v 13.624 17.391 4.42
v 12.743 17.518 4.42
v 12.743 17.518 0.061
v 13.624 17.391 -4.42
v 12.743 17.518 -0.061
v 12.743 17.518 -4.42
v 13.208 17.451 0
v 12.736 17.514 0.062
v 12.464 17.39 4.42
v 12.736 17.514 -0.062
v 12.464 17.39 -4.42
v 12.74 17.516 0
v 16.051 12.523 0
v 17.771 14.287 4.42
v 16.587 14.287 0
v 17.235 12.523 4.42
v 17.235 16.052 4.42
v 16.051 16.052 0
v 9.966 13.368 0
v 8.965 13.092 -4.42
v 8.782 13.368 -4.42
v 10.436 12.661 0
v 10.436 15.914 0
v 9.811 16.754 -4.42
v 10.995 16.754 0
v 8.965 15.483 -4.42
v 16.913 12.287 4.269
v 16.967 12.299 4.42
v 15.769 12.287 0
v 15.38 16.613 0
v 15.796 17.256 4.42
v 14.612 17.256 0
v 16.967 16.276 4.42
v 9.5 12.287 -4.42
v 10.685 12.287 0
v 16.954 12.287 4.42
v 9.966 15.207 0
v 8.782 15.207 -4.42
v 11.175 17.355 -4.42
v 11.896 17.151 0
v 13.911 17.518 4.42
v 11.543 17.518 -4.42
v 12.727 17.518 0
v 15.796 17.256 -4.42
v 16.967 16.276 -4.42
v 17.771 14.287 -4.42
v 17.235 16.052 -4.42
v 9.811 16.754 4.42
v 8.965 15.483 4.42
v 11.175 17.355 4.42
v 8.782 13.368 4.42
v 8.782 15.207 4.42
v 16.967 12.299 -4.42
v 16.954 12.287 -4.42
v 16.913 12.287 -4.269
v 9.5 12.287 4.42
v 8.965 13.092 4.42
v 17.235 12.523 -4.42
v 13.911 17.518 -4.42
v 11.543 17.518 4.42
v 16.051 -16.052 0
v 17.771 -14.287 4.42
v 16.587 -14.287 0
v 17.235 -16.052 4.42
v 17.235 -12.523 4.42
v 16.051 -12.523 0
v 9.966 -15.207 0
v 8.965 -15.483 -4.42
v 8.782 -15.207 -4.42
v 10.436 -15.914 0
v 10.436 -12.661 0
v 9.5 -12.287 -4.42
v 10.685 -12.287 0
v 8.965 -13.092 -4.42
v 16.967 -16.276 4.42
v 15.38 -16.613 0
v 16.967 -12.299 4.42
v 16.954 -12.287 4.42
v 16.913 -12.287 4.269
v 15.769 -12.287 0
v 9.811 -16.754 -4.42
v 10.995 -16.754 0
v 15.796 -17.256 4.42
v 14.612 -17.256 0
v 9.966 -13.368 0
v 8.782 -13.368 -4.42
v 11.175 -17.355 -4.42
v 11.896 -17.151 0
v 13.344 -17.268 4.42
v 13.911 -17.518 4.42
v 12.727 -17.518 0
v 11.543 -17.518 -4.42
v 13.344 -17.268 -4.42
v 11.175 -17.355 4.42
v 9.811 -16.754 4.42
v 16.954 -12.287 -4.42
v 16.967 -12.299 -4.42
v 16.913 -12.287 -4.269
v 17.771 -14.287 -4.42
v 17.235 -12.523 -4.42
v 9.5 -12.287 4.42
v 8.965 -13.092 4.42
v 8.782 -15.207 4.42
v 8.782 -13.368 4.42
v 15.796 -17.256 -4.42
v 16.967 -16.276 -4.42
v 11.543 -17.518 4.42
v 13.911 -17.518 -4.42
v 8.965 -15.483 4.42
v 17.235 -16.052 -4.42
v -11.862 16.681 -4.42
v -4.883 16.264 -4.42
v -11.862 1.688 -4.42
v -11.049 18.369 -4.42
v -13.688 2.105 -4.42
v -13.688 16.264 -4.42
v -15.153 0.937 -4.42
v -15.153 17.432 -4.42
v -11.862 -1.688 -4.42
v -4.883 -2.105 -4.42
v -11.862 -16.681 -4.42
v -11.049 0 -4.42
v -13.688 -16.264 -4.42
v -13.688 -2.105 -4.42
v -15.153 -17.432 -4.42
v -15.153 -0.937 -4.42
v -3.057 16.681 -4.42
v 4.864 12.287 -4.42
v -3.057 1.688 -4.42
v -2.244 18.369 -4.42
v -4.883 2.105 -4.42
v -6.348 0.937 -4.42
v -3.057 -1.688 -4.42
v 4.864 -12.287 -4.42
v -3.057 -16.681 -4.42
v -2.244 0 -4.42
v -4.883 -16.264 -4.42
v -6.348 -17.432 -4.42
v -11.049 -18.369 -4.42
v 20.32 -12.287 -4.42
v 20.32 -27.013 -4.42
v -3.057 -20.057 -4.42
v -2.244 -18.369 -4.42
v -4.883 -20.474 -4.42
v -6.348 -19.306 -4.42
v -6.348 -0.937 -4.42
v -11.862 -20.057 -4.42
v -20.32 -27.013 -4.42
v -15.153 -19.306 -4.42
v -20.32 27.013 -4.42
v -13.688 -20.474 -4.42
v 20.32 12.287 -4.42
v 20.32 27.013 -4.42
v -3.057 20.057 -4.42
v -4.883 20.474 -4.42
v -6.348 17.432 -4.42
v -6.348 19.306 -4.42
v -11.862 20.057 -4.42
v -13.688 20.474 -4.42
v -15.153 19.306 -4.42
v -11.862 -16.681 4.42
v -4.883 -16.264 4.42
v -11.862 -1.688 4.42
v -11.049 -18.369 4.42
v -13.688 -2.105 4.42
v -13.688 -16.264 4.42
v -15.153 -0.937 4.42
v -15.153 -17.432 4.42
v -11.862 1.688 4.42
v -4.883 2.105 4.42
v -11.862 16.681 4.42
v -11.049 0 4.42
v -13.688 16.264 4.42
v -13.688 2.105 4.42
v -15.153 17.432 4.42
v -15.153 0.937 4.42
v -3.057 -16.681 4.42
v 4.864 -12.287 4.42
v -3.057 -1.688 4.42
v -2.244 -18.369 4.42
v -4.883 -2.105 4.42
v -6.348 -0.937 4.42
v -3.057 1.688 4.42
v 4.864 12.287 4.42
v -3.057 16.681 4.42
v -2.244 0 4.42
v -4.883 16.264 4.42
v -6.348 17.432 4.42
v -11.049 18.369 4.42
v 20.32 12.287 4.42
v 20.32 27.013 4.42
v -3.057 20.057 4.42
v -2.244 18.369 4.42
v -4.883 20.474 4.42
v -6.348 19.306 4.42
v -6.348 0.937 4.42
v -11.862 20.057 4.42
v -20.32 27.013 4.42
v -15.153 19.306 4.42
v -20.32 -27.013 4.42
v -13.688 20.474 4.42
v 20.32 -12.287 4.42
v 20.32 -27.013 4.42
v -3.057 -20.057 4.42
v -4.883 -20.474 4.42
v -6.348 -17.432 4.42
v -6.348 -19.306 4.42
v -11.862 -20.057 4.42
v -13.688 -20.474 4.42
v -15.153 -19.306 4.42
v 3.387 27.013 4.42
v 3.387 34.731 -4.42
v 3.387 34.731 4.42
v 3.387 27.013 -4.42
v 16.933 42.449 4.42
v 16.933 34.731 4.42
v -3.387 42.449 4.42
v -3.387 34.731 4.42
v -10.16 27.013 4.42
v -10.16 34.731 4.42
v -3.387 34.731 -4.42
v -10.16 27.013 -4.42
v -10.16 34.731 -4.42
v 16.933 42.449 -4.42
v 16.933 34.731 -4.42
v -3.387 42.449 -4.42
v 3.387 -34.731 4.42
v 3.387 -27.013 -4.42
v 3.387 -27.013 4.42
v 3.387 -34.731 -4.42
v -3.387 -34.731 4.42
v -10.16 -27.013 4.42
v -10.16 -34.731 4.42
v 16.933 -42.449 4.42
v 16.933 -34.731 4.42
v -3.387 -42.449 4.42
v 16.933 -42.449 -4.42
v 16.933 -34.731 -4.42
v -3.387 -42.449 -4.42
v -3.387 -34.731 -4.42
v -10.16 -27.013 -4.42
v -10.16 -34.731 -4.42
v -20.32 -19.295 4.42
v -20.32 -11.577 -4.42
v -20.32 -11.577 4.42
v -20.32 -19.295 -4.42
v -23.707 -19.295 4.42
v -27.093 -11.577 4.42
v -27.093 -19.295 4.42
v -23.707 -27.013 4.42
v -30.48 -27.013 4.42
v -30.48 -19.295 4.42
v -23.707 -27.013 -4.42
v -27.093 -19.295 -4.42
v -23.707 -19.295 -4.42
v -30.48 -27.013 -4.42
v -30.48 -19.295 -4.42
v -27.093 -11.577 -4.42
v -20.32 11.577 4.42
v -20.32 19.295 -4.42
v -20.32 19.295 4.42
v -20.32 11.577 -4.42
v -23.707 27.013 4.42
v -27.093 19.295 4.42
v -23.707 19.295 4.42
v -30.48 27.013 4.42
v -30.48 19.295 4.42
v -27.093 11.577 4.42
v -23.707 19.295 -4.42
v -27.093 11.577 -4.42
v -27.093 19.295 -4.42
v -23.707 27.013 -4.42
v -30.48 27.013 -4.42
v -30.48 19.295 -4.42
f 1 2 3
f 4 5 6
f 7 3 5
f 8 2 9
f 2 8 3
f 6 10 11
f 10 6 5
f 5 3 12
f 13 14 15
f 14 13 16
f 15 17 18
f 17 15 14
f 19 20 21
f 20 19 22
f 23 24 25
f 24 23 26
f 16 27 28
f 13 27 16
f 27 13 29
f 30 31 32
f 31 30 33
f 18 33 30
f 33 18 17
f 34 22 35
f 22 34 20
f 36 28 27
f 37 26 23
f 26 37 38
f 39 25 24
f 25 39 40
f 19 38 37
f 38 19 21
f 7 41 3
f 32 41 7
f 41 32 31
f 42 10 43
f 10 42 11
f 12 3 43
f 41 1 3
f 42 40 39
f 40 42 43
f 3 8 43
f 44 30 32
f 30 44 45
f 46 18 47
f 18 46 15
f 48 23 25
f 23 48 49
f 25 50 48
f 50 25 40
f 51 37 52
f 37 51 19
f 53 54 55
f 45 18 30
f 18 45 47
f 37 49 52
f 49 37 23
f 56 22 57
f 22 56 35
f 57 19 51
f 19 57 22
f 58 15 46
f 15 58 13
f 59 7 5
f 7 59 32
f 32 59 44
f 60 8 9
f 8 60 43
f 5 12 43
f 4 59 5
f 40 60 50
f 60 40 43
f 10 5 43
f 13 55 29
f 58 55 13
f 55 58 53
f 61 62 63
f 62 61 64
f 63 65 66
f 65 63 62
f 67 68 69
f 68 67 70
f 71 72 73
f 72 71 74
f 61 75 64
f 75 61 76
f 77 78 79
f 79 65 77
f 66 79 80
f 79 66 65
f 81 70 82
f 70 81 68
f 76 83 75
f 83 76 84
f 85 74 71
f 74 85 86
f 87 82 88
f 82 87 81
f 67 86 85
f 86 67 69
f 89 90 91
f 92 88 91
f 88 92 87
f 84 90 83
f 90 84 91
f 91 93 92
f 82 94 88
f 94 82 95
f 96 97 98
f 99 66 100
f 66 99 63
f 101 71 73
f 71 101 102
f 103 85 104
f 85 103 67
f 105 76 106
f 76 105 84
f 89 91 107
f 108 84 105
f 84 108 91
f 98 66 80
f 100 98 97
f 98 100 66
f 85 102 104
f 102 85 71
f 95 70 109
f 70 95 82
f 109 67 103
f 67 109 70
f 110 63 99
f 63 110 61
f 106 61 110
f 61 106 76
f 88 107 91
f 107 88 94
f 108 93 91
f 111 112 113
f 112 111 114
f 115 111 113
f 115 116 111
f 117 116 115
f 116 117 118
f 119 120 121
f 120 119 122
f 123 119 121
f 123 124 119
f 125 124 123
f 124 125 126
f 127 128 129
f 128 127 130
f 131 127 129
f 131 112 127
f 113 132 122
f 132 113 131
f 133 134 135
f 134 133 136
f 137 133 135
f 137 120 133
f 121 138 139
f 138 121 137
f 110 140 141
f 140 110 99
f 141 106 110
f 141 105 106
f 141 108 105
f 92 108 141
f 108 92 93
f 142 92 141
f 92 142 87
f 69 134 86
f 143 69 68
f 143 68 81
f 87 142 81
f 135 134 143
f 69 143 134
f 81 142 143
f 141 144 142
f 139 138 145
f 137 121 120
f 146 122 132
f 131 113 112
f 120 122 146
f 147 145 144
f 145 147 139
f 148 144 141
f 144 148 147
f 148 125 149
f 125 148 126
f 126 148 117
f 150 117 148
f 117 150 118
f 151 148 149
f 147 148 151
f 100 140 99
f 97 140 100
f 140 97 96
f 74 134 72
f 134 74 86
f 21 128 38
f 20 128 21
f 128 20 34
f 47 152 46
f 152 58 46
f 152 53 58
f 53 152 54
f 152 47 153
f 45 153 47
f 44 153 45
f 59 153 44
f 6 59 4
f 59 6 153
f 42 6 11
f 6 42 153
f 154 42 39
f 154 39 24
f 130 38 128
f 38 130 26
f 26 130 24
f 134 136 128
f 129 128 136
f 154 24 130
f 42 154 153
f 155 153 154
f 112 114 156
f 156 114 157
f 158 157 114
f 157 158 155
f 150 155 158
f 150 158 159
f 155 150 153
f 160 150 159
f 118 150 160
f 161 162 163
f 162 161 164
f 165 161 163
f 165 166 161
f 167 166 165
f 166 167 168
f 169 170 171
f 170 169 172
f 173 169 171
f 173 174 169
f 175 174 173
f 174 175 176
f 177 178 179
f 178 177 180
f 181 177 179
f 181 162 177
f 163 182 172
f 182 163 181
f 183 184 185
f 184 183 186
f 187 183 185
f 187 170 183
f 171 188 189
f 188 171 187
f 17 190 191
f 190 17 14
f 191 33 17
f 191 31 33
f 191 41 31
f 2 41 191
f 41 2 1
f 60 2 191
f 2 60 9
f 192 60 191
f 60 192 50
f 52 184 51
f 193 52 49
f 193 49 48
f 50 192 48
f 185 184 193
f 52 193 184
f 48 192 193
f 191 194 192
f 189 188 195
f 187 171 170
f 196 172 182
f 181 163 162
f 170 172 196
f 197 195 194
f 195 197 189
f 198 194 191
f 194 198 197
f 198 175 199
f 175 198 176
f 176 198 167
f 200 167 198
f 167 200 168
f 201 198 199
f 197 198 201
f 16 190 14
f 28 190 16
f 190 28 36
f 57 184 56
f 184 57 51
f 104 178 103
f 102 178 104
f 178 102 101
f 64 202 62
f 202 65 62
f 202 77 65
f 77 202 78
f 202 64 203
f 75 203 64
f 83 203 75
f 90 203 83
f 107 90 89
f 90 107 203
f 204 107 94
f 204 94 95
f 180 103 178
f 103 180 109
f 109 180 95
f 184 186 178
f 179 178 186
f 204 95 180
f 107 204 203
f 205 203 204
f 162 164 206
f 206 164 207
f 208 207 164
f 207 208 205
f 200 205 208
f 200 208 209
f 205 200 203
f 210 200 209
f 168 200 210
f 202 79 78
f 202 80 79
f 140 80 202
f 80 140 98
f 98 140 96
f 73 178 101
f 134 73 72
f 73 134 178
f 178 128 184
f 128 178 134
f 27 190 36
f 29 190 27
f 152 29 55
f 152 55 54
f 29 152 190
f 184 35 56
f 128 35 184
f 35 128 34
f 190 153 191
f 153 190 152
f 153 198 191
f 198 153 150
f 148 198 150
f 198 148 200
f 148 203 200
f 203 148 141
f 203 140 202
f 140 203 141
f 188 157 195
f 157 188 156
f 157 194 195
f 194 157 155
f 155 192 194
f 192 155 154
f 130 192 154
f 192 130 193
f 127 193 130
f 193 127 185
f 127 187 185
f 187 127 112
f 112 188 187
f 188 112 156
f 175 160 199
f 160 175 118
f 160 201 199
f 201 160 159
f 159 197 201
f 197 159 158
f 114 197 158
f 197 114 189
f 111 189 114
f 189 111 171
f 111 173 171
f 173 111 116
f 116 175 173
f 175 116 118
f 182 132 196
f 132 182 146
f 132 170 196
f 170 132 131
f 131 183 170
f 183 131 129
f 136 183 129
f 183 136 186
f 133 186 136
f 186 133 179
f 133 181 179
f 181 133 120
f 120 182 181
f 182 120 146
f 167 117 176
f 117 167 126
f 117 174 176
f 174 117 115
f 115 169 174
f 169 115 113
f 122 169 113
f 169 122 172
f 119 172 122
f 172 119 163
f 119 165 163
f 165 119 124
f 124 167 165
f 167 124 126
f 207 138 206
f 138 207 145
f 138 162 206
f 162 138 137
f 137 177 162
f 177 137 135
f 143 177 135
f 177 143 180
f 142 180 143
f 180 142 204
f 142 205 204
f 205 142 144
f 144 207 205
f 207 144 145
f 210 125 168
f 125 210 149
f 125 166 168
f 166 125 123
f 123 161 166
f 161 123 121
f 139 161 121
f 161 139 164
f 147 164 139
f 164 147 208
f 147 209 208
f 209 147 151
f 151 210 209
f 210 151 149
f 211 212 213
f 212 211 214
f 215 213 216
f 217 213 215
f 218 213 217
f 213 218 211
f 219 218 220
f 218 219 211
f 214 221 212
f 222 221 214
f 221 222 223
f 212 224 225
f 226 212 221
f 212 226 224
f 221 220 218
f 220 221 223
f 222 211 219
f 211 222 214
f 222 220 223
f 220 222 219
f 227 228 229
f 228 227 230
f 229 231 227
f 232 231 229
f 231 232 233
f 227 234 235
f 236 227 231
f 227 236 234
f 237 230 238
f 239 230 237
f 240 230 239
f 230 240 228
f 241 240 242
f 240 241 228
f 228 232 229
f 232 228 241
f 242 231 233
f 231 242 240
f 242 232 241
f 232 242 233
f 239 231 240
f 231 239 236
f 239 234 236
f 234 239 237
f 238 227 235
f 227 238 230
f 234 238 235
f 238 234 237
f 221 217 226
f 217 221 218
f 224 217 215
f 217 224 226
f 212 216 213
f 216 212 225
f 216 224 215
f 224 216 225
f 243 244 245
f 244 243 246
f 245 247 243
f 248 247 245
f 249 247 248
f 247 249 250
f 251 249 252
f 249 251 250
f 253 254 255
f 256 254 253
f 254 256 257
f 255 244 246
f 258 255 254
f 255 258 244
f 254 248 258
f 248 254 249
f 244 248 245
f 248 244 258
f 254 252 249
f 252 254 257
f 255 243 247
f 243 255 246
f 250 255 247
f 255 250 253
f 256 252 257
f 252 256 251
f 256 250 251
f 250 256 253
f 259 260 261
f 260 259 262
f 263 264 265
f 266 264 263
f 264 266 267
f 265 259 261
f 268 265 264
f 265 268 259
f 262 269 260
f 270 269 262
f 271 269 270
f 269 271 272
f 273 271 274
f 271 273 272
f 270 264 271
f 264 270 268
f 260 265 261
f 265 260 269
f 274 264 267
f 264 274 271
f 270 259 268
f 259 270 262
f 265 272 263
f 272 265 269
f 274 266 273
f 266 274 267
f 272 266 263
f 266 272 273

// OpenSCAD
mpi = 25.4; // millimeters per inch
height = 1.6 * mpi;
width = 2.127 * mpi;

w= 0.9675 * mpi;
h= (0.257 + 0.4) * mpi;
offset = 1.04 * mpi / 2;

radius = 0.257 * mpi / 2;
o = w/2 + 2;

screws = 0.17 * mpi / 2;
corner = width / 2 * 0.68;

ph = height/6;
pw = width/7;

module pixel(x=0,y=0) {
  translate([x*ph, y*pw, 0]) cube(size=[ph, pw, 0.348 * mpi], center=true);
}
union() {

difference() {

  linear_extrude(height = 0.348 * mpi, center = true, convexity = 10, twist = 0) {

    difference() {
      square([height, width], center = true);

      translate([offset,0,0]) {
        square([h, w], center = true);
      }

      translate([-offset/3,0,0]) {
        circle(r=screws);
        translate([0, corner, 0]) {
          circle(r=screws);
        }
        translate([0, -corner, 0]) {
          circle(r=screws);
        }
      }
      translate([-offset,0,0]) {
        circle(r=screws);
        translate([0, corner, 0]) {
          circle(r=screws);
        }
        translate([0, -corner, 0]) {
          circle(r=screws);
        }
      }

    }
  }

  translate([offset,0,0]) {
    translate([0, o, 0]) {
      cylinder(r = radius,h=h,center=true);
      rotate(15,[0,1,0])
      cylinder(r = radius,h=h,center=true);
      rotate(-15,[0,1,0])
      cylinder(r = radius,h=h,center=true);
    }
    translate([0, -o, 0]) {
      rotate(15,[0,1,0])
      cylinder(r = radius,h=h,center=true);
      rotate(-15,[0,1,0])
      cylinder(r = radius,h=h,center=true);
    }
  }

}
pixel(0,4);
pixel(-1,4);
pixel(0,-4);
pixel(-1,-4);
pixel(0,-5);
pixel(1,-5);
pixel(2,-5);
pixel(0,5);
pixel(1,5);
pixel(2,5);
pixel(-3.5,-2);
pixel(-4,-3);
pixel(-3.5,2);
pixel(-4,3);
}
